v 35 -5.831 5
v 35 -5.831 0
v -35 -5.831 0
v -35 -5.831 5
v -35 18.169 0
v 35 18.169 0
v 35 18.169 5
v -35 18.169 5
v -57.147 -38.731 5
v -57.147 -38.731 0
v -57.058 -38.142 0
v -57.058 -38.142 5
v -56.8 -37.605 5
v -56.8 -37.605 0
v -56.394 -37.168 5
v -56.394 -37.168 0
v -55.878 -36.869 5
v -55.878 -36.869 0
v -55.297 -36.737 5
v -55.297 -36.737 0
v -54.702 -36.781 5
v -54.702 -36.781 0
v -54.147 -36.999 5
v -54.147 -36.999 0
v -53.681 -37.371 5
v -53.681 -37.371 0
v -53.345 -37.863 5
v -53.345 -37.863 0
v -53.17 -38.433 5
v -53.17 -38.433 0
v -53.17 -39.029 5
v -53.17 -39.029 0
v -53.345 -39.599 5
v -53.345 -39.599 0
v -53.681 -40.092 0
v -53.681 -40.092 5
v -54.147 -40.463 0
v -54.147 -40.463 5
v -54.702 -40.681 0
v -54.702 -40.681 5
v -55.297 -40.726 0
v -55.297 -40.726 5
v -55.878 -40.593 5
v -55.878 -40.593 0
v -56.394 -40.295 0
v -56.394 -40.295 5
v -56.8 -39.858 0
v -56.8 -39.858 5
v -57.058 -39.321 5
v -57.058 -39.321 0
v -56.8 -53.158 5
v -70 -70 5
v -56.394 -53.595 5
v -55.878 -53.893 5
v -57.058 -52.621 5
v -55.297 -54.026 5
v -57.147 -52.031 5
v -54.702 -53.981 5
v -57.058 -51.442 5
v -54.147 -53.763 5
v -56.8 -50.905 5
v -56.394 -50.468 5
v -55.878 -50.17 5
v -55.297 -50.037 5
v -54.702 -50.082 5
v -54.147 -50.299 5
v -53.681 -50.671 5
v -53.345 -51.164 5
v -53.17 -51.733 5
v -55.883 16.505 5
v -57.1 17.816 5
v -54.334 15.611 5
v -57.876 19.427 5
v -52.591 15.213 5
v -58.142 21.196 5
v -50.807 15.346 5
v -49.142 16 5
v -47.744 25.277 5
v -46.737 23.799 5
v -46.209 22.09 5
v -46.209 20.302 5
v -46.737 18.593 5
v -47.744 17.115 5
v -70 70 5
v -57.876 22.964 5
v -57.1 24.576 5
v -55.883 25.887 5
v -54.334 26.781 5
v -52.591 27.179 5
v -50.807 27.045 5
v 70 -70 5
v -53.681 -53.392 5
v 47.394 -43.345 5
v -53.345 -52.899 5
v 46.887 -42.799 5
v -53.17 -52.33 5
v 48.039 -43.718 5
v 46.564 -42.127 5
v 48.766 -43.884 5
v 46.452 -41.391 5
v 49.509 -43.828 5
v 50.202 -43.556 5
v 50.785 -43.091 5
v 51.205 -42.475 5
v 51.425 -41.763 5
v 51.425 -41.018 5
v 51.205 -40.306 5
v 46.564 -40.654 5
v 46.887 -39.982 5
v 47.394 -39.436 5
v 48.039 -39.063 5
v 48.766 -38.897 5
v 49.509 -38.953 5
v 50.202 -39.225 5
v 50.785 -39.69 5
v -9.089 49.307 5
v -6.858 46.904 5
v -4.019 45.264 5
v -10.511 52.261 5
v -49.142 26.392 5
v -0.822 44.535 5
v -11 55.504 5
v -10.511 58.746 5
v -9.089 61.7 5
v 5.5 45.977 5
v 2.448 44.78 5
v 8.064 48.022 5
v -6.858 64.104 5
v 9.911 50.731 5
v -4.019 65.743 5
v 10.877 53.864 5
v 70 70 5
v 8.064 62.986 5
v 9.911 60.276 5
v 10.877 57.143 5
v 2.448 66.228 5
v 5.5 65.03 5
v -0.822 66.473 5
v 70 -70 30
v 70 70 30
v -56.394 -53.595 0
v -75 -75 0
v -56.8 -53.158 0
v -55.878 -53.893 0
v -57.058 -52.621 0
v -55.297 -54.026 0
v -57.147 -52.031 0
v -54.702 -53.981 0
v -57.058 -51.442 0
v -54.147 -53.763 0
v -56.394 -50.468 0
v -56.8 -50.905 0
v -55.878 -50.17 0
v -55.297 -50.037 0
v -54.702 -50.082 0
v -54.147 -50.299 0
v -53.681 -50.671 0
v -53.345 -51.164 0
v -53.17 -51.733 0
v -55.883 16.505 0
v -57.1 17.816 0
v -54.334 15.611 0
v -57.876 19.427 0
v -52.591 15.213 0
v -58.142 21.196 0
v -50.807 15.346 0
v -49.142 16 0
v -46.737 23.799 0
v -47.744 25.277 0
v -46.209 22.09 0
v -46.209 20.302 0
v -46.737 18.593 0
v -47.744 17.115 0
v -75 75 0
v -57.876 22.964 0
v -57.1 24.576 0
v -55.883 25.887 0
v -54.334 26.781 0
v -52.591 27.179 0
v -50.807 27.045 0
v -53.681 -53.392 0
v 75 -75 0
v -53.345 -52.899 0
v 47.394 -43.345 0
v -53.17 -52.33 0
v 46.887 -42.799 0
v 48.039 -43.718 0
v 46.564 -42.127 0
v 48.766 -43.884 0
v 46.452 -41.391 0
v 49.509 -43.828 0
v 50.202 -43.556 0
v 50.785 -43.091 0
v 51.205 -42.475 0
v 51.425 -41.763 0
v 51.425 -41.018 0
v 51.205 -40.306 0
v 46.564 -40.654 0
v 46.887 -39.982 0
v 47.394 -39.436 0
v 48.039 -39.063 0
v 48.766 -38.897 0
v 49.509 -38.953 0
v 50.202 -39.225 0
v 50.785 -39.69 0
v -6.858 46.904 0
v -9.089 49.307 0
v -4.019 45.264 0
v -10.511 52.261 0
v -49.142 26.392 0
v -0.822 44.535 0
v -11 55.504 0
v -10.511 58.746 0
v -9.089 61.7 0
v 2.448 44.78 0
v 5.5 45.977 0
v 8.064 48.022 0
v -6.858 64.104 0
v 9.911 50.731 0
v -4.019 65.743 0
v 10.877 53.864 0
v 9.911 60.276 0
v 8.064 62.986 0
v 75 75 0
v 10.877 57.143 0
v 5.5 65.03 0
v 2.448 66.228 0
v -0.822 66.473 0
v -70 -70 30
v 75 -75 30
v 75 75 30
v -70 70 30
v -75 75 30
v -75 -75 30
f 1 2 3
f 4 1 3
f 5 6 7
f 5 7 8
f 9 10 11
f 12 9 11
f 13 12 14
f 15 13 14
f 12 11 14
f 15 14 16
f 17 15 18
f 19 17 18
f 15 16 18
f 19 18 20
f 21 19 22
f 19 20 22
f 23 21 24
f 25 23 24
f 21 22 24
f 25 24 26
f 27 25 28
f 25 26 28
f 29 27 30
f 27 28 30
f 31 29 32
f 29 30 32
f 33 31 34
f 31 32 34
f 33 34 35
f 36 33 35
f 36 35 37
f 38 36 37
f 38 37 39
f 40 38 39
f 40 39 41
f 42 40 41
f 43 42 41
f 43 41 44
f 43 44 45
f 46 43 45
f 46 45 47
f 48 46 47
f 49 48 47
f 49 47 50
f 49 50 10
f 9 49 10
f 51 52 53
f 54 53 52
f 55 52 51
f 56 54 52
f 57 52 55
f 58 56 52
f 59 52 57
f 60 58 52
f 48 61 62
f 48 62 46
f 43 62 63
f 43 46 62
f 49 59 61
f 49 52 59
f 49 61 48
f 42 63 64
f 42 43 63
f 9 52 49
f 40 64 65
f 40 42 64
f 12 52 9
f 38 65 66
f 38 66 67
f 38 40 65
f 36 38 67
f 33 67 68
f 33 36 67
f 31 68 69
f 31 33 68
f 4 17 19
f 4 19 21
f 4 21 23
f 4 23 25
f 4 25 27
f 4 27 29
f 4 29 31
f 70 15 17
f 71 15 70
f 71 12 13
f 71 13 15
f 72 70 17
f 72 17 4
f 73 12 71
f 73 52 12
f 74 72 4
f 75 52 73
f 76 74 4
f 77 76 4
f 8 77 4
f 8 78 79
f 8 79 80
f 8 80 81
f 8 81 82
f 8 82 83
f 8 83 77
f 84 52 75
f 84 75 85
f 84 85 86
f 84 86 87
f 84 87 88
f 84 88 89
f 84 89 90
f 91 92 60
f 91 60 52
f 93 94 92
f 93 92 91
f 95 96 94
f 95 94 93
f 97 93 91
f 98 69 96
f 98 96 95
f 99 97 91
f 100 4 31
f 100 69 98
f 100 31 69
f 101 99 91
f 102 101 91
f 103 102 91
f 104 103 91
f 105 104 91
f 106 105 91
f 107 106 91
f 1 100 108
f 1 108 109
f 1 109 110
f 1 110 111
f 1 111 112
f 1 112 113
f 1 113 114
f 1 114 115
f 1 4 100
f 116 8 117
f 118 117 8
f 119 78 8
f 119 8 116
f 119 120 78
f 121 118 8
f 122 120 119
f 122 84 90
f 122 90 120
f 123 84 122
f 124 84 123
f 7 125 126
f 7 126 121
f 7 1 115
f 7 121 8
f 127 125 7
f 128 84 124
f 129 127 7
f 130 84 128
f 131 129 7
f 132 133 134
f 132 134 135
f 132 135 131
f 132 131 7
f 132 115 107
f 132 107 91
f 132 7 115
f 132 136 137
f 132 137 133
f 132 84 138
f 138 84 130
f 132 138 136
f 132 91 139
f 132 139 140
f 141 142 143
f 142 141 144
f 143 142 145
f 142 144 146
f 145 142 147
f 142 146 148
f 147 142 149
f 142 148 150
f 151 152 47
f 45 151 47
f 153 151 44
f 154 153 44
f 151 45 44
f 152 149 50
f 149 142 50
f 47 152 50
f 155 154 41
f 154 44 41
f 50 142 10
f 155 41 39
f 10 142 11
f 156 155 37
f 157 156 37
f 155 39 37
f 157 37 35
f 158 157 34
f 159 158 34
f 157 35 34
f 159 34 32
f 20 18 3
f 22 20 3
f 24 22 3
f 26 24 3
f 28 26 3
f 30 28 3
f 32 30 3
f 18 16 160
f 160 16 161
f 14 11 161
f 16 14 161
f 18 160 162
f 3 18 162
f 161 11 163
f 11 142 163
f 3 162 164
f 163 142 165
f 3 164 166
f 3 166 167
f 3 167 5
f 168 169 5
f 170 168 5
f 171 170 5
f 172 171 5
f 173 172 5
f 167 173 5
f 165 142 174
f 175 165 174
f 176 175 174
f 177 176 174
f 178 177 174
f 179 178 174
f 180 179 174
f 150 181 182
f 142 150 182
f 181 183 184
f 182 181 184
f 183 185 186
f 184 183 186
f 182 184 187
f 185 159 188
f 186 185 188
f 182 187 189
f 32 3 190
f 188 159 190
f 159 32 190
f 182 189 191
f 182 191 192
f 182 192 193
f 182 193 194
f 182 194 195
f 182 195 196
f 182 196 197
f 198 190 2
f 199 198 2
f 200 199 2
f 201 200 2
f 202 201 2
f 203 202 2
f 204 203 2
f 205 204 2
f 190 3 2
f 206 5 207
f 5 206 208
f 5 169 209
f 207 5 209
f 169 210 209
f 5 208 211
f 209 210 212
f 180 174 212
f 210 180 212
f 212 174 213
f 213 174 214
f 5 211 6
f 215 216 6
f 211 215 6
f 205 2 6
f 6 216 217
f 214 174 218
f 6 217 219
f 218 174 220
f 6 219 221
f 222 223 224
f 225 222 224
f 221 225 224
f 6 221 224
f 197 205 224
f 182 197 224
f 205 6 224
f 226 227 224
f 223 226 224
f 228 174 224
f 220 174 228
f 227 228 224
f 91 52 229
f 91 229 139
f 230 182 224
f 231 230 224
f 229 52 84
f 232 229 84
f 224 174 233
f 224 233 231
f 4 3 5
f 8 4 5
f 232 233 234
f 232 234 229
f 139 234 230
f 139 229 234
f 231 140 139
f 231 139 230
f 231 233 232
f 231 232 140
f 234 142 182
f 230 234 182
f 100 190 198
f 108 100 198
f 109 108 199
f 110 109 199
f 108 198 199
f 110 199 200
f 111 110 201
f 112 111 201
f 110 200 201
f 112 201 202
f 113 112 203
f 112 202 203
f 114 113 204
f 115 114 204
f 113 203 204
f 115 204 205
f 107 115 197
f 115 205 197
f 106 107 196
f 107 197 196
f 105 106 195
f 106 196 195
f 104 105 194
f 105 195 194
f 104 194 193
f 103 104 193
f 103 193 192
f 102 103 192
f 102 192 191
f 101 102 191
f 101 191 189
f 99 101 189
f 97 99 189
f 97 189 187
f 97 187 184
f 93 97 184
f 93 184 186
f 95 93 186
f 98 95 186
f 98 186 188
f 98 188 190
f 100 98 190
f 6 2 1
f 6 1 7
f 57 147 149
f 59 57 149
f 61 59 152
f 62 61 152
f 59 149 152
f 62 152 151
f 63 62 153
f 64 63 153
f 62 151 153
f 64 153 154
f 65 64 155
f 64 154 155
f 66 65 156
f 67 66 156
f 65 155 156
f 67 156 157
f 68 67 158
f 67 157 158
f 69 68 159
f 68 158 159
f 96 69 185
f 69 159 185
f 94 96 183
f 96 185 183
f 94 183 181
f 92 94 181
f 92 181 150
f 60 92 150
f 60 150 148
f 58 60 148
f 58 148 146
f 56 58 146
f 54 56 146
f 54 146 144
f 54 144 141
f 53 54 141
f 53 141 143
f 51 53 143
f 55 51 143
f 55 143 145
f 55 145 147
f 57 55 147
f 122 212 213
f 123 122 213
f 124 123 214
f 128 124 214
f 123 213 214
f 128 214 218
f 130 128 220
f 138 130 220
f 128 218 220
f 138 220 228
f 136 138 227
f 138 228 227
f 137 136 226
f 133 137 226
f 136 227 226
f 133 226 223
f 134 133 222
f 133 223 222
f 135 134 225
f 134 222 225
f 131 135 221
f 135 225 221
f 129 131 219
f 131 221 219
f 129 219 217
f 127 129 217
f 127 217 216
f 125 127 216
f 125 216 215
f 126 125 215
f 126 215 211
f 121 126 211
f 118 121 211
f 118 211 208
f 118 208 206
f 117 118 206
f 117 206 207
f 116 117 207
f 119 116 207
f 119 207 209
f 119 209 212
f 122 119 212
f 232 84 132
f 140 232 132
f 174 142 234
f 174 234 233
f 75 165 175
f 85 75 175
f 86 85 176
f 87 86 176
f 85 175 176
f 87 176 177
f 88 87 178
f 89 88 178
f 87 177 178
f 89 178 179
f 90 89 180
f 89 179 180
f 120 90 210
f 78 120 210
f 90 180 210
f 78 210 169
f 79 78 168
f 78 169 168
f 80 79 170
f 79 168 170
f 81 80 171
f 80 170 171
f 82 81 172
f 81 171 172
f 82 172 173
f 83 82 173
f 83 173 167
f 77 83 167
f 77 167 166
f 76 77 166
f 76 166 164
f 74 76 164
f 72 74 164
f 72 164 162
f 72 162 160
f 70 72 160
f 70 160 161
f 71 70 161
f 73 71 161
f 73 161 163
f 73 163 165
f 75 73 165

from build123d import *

# Parameters (mm, degrees)
SKETCH4_W           = 150
SKETCH4_H           = 150
BOSS_EXTRUDE1_DEPTH = 30
SHELL2_T            = -5
SKETCH5_R           = 11
CUT_EXTRUDE1_DEPTH  = 10
SKETCH6_W           = 70
SKETCH6_H           = 24
CUT_EXTRUDE2_DEPTH  = 10
SKETCH7_R           = 6
CUT_EXTRUDE3_DEPTH  = 10
SKETCH8_R           = 2.5
CUT_EXTRUDE4_DEPTH  = 10
SKETCH10_R          = 2
CUT_EXTRUDE5_DEPTH  = 10


with BuildPart() as part:
    # Sketch4 → Boss-Extrude1 (new body)
    with BuildSketch(Plane.XY):
        Rectangle(SKETCH4_W, SKETCH4_H)
    extrude(amount=BOSS_EXTRUDE1_DEPTH)

    # Shell2
    shell2_openings = [part.faces().sort_by_distance(p)[0] for p in [
        (0, 0, 30),
    ]]
    offset(amount=SHELL2_T, openings=shell2_openings, kind=Kind.INTERSECTION)

    # Sketch5 → Cut-Extrude1 (cut)
    with BuildSketch(Plane(origin=(0, 0, 0), x_dir=(-1, 0, 0), z_dir=(0, 0, -1))):
        with Locations((0, 55.503756803)):
            Circle(SKETCH5_R)
    extrude(amount=-CUT_EXTRUDE1_DEPTH, mode=Mode.SUBTRACT)

    # Sketch6 → Cut-Extrude2 (cut)
    with BuildSketch(Plane(origin=(0, 0, 0), x_dir=(-1, 0, 0), z_dir=(0, 0, -1))):
        with Locations((0, 6.168751782)):
            Rectangle(SKETCH6_W, SKETCH6_H)
    extrude(amount=-CUT_EXTRUDE2_DEPTH, mode=Mode.SUBTRACT)

    # Sketch7 → Cut-Extrude3 (cut)
    with BuildSketch(Plane(origin=(0, 0, 0), x_dir=(-1, 0, 0), z_dir=(0, 0, -1))):
        with Locations((52.142360775, 21.195860283)):
            Circle(SKETCH7_R)
    extrude(amount=-CUT_EXTRUDE3_DEPTH, mode=Mode.SUBTRACT)

    # Sketch8 → Cut-Extrude4 (cut)
    with BuildSketch(Plane(origin=(0, 0, 0), x_dir=(-1, 0, 0), z_dir=(0, 0, -1))):
        with Locations((-48.952452987, -41.390507081)):
            Circle(SKETCH8_R)
    extrude(amount=-CUT_EXTRUDE4_DEPTH, mode=Mode.SUBTRACT)

    # Sketch10 → Cut-Extrude5 (cut)
    with BuildSketch(Plane(origin=(0, 0, 0), x_dir=(-1, 0, 0), z_dir=(0, 0, -1))):
        with Locations((55.147282701, -52.031429677)):
            Circle(SKETCH10_R)
        with Locations((55.147282701, -38.731179224)):
            Circle(SKETCH10_R)
    extrude(amount=-CUT_EXTRUDE5_DEPTH, mode=Mode.SUBTRACT)


solid = part.part
